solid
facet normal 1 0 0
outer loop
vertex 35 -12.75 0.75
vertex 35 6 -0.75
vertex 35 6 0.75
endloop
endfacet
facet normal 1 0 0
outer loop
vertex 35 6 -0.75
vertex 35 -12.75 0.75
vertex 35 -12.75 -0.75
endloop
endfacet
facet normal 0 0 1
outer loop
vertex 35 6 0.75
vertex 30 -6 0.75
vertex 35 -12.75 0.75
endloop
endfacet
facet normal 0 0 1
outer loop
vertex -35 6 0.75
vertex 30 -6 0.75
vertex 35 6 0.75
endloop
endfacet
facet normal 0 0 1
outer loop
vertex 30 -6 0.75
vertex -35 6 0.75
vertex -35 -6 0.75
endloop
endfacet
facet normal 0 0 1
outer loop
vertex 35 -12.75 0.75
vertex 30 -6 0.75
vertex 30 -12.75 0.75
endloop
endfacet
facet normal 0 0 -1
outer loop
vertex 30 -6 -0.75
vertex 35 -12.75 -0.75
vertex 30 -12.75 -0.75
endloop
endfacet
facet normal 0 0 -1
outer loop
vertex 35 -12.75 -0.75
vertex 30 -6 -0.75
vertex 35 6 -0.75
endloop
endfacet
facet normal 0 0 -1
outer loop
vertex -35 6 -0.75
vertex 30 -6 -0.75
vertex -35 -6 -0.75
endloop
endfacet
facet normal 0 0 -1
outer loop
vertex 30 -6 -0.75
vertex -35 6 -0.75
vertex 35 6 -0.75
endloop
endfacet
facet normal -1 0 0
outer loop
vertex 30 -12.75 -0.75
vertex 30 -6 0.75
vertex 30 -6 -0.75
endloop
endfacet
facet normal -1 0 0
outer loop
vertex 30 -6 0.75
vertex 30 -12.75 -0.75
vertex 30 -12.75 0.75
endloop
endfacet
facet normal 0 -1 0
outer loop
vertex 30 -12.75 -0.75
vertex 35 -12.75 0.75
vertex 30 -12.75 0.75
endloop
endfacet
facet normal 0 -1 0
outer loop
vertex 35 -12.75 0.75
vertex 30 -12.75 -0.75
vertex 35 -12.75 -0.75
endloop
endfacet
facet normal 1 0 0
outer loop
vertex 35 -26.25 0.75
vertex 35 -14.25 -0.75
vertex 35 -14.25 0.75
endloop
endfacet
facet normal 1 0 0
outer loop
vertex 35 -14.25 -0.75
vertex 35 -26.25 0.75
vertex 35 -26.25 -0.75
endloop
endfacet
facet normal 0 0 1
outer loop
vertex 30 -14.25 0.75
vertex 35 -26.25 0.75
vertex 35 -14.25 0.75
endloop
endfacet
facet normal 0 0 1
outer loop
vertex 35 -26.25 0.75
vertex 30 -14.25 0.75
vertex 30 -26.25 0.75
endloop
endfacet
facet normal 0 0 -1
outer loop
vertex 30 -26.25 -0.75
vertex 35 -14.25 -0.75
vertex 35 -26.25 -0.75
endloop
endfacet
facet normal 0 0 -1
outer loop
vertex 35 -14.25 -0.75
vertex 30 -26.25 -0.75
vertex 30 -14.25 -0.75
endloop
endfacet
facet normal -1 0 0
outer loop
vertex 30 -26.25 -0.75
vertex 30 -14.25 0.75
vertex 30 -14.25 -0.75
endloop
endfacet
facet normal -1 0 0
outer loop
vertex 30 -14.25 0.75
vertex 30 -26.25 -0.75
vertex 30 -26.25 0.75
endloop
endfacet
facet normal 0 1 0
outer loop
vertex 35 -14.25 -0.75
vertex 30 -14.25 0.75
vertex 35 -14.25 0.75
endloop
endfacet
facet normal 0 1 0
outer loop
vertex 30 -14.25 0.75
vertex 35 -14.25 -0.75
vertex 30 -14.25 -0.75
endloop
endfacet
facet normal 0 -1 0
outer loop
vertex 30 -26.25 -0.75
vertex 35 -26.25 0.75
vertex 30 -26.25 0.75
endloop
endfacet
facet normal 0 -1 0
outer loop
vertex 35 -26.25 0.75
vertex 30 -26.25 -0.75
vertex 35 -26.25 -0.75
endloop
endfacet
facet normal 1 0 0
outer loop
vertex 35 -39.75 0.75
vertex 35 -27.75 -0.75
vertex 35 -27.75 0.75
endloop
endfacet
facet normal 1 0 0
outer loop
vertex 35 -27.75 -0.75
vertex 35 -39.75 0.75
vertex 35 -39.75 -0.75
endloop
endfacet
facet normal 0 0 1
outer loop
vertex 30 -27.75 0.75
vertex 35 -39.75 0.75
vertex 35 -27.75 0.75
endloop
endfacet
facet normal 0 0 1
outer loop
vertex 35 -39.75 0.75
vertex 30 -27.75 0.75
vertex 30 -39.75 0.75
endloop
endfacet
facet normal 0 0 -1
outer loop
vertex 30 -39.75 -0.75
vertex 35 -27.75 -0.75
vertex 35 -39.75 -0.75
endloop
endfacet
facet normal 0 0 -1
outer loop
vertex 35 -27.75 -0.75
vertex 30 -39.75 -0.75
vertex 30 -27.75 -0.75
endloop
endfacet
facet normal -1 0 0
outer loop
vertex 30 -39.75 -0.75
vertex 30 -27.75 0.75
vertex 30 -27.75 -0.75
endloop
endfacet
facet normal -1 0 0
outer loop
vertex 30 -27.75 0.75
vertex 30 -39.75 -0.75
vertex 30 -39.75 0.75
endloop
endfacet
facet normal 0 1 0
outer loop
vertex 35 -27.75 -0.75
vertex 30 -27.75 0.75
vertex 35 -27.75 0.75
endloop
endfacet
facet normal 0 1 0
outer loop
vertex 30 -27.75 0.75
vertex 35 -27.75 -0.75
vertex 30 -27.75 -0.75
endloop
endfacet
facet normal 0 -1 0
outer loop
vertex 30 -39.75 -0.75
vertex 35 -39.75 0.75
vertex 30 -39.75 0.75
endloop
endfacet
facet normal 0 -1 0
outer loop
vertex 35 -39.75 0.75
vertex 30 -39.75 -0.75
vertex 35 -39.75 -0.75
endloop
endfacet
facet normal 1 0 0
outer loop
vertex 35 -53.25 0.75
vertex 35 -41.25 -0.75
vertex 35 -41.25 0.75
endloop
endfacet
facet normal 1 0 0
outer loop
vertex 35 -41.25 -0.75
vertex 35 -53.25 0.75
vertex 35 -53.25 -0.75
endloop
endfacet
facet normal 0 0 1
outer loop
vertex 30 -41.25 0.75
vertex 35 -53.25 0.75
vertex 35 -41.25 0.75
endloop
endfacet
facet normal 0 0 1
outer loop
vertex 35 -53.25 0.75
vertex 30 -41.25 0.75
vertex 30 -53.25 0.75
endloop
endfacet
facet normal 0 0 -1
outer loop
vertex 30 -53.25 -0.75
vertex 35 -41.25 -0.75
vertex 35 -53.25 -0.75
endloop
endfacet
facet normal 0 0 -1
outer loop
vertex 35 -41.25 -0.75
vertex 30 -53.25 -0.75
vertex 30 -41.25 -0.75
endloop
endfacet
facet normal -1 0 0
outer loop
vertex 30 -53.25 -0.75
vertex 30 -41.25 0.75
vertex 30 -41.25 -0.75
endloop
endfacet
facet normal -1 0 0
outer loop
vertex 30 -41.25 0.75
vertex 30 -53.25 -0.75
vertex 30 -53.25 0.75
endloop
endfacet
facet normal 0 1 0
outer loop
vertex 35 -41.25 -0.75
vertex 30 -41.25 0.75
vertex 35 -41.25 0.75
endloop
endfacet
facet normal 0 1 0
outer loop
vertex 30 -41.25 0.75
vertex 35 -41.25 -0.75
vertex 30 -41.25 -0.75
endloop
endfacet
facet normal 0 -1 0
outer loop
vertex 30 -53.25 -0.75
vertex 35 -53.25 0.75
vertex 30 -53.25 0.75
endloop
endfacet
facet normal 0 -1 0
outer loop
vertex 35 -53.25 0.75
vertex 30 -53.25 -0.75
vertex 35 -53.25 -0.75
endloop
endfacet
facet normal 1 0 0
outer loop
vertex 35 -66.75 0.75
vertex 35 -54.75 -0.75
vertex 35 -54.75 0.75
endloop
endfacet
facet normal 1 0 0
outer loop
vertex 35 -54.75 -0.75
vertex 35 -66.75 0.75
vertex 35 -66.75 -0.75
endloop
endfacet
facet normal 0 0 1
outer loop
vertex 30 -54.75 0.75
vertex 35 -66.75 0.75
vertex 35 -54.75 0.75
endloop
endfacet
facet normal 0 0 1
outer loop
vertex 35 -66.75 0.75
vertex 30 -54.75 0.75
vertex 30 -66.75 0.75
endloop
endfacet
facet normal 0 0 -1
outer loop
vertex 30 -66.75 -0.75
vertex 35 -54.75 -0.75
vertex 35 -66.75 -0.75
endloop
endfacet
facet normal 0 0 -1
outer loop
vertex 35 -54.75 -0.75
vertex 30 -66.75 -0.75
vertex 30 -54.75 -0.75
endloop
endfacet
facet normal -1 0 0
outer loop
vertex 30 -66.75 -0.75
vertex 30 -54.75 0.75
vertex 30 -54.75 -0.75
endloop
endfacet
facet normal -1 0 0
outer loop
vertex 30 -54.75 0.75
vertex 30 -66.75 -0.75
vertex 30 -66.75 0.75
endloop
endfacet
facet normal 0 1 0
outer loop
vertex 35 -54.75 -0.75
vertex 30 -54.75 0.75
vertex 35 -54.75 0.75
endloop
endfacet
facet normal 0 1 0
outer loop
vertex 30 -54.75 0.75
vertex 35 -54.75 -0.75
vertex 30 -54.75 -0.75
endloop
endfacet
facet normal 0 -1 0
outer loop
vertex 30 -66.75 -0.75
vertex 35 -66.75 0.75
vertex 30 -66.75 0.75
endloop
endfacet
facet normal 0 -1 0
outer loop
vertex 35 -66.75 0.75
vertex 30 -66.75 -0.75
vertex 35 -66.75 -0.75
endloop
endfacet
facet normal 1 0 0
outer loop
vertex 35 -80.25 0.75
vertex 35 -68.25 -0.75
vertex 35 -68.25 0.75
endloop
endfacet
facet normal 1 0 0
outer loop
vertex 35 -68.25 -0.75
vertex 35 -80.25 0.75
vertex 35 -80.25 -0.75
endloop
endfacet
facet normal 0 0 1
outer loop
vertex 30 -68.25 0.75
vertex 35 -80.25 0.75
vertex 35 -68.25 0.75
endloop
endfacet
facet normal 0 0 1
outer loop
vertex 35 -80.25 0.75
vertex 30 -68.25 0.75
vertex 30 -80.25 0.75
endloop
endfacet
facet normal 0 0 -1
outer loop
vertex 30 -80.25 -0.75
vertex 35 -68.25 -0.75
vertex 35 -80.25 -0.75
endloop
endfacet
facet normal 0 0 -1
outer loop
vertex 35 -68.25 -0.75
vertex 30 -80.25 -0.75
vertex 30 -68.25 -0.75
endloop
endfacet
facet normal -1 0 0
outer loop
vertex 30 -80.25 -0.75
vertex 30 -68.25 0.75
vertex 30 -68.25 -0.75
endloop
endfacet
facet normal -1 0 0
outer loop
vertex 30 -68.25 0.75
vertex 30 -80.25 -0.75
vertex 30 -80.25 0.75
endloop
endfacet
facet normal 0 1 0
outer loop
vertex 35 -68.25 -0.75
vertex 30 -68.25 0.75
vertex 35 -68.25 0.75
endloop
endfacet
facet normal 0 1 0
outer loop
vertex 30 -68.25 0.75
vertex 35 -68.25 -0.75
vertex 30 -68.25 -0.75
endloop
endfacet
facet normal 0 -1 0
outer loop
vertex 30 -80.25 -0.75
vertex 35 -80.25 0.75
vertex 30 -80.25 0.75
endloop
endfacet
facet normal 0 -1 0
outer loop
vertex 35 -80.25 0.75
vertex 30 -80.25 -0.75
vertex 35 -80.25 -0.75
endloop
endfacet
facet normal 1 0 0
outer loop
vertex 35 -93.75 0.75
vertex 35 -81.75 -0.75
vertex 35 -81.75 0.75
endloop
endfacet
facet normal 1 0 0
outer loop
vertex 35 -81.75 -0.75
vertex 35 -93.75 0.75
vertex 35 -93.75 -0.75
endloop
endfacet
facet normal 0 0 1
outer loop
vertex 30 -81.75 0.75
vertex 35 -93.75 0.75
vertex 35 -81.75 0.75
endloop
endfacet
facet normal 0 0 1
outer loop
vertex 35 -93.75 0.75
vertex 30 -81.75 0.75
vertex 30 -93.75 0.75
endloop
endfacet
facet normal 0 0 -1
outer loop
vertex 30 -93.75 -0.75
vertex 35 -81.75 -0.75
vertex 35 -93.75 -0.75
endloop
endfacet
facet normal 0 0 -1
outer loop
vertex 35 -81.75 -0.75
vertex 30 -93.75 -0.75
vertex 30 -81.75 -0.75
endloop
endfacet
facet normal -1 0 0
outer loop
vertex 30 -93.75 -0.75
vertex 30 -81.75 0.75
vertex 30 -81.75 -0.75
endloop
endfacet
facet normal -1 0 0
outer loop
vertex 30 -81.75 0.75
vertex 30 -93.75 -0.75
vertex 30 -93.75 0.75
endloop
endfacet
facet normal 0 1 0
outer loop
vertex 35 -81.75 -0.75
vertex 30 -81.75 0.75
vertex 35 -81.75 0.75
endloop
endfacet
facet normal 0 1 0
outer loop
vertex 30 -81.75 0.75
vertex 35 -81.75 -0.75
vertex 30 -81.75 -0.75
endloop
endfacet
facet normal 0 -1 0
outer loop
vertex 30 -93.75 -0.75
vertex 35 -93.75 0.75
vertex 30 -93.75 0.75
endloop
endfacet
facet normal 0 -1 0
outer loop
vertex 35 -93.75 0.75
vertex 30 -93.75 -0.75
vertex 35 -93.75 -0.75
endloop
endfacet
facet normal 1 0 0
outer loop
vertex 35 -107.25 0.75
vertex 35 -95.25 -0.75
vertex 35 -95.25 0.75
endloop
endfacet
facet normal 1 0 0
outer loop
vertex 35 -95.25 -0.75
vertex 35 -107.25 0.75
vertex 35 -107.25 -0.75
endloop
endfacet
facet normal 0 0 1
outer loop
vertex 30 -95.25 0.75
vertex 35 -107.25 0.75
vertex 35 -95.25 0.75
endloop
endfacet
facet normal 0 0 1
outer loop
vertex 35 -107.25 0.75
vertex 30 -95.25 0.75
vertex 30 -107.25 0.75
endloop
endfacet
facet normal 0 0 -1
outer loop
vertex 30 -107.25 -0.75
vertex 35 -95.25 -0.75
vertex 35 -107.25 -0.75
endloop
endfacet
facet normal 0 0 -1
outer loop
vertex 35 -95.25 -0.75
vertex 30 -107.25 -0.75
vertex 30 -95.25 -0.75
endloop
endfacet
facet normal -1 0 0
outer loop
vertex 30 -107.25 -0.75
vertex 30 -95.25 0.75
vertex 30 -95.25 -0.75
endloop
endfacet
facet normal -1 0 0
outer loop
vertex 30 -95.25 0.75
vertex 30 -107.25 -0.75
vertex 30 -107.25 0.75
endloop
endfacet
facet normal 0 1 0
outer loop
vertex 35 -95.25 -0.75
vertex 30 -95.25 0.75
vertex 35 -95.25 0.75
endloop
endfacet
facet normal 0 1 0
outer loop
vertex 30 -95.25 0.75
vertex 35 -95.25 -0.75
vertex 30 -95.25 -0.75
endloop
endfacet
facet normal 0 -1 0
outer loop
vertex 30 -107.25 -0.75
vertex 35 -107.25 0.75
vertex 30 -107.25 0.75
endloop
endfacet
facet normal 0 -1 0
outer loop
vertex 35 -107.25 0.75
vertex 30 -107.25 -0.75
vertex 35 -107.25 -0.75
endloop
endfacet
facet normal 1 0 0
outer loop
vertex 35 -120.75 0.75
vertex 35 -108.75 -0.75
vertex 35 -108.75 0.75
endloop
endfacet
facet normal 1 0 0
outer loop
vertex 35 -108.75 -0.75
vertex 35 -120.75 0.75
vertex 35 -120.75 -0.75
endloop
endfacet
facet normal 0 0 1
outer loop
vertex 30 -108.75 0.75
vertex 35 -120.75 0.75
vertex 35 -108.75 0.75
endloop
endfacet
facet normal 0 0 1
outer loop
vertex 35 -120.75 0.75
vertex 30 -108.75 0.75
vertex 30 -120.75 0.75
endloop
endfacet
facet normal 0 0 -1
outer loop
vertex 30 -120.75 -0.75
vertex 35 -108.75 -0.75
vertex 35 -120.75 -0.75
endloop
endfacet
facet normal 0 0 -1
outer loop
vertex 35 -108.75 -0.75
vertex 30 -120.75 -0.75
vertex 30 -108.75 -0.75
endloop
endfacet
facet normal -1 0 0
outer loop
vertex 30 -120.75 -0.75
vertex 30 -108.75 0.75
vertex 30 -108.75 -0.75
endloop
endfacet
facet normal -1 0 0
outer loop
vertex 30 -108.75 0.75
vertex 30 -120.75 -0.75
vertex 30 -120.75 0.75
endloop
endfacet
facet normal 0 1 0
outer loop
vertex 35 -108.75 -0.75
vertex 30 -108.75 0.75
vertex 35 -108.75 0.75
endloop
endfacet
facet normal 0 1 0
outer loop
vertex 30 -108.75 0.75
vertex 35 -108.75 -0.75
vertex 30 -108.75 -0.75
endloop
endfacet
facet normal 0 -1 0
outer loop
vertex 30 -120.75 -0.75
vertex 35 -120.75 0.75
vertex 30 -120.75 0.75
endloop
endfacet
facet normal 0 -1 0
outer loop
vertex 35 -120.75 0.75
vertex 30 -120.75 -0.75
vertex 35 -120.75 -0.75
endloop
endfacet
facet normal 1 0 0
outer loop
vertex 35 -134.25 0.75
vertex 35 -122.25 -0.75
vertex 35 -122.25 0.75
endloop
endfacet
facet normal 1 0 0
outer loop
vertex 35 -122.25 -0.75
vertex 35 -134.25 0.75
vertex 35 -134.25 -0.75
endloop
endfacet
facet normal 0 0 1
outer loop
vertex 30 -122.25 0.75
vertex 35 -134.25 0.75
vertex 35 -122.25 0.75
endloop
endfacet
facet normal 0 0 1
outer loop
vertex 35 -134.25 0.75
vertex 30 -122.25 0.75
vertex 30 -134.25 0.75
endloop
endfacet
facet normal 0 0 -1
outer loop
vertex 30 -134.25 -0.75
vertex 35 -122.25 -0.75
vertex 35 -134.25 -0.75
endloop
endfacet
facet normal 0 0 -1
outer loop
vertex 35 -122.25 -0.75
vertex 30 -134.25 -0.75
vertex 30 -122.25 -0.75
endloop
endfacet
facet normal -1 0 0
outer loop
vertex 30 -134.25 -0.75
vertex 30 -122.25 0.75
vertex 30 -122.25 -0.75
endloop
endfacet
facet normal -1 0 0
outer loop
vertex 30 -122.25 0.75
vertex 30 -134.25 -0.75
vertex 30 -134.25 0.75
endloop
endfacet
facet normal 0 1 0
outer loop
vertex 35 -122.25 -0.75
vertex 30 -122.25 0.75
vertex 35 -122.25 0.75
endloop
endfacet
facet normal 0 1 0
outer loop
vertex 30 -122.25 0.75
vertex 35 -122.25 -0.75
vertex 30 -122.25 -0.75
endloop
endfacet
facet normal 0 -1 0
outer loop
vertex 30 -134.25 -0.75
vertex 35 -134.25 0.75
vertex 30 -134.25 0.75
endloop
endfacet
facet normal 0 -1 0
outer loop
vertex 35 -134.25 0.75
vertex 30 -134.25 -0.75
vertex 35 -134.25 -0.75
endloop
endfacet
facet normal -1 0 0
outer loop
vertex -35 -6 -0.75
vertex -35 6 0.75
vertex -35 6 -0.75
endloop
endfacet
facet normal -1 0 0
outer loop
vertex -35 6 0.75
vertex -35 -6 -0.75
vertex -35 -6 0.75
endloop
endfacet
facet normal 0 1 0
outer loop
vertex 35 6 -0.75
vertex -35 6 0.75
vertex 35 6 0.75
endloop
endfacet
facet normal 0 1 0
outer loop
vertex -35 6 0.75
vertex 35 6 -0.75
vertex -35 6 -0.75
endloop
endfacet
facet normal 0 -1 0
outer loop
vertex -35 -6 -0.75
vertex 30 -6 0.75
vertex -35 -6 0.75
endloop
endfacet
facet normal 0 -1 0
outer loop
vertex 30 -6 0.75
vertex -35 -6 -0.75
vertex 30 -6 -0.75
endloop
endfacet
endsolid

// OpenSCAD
// Dimensions for 10-well agarose gel comb
$fn = 64;

// Spine (back bar) dimensions
spine_length = 70;   // X direction
spine_width = 12;   // Y direction
spine_thickness = 1.5; // Z direction (height)

// Tooth dimensions
tooth_width = 5.0;    // X direction (width of each tooth)
tooth_length = 12;     // Y direction (length of each tooth, extending from spine)
tooth_gap = 1.5;       // Gap between adjacent teeth (in Y direction)

// Number of teeth
num_teeth = 10;

// Total width of all teeth and gaps
total_tooth_width = num_teeth * tooth_width;
total_gap_width = (num_teeth - 1) * tooth_gap;
total_y_span = total_tooth_width + total_gap_width;

// Center the tooth row on the spine in X direction
// Spine is 70 mm long in X, so we center the tooth row (12 mm in Y) on the spine's X-axis
// The tooth row extends in -Y direction from the spine's edge

// Calculate offset to center the tooth row in X
tooth_row_offset_x = (spine_length - tooth_width) / 2;

// Position of first tooth's X start (from spine's edge)
tooth_start_x = tooth_row_offset_x;

// Build the comb: start with the spine
module comb() {
    // Spine (back bar)
    translate([0, 0, 0])
        cube([spine_length, spine_width, spine_thickness], center = true);

    // Add teeth using a loop
    for (i = [0 : num_teeth - 1]) {
        // Calculate Y position of this tooth
        // Start from the spine's -Y edge (spine_width/2) and go further in -Y
        // The first tooth starts at spine_width/2 + tooth_gap/2 (to account for gap spacing)
        // But we'll use cumulative gaps to position each tooth
        tooth_y_offset = spine_width / 2 + (tooth_length + tooth_gap) * i + tooth_gap / 2;

        // Adjust Y to place tooth in -Y direction from spine
        // The tooth is centered in X over the spine
        tooth_x_center = spine_length / 2;

        // Position of this tooth's center in X
        tooth_x_start = tooth_x_center - tooth_width / 2;

        // Translate to the correct position
        translate([tooth_x_start, -tooth_y_offset, 0])
            cube([tooth_width, tooth_length, spine_thickness], center = true);
    }
}

// Render the comb
comb();
